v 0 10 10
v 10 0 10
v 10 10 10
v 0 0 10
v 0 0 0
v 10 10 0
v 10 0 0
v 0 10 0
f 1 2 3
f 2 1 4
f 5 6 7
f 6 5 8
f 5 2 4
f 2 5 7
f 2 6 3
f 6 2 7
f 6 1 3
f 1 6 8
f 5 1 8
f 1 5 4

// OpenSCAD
// File with no Customizer parameters at all.
module helper() {
    cube(10);
}
helper();
